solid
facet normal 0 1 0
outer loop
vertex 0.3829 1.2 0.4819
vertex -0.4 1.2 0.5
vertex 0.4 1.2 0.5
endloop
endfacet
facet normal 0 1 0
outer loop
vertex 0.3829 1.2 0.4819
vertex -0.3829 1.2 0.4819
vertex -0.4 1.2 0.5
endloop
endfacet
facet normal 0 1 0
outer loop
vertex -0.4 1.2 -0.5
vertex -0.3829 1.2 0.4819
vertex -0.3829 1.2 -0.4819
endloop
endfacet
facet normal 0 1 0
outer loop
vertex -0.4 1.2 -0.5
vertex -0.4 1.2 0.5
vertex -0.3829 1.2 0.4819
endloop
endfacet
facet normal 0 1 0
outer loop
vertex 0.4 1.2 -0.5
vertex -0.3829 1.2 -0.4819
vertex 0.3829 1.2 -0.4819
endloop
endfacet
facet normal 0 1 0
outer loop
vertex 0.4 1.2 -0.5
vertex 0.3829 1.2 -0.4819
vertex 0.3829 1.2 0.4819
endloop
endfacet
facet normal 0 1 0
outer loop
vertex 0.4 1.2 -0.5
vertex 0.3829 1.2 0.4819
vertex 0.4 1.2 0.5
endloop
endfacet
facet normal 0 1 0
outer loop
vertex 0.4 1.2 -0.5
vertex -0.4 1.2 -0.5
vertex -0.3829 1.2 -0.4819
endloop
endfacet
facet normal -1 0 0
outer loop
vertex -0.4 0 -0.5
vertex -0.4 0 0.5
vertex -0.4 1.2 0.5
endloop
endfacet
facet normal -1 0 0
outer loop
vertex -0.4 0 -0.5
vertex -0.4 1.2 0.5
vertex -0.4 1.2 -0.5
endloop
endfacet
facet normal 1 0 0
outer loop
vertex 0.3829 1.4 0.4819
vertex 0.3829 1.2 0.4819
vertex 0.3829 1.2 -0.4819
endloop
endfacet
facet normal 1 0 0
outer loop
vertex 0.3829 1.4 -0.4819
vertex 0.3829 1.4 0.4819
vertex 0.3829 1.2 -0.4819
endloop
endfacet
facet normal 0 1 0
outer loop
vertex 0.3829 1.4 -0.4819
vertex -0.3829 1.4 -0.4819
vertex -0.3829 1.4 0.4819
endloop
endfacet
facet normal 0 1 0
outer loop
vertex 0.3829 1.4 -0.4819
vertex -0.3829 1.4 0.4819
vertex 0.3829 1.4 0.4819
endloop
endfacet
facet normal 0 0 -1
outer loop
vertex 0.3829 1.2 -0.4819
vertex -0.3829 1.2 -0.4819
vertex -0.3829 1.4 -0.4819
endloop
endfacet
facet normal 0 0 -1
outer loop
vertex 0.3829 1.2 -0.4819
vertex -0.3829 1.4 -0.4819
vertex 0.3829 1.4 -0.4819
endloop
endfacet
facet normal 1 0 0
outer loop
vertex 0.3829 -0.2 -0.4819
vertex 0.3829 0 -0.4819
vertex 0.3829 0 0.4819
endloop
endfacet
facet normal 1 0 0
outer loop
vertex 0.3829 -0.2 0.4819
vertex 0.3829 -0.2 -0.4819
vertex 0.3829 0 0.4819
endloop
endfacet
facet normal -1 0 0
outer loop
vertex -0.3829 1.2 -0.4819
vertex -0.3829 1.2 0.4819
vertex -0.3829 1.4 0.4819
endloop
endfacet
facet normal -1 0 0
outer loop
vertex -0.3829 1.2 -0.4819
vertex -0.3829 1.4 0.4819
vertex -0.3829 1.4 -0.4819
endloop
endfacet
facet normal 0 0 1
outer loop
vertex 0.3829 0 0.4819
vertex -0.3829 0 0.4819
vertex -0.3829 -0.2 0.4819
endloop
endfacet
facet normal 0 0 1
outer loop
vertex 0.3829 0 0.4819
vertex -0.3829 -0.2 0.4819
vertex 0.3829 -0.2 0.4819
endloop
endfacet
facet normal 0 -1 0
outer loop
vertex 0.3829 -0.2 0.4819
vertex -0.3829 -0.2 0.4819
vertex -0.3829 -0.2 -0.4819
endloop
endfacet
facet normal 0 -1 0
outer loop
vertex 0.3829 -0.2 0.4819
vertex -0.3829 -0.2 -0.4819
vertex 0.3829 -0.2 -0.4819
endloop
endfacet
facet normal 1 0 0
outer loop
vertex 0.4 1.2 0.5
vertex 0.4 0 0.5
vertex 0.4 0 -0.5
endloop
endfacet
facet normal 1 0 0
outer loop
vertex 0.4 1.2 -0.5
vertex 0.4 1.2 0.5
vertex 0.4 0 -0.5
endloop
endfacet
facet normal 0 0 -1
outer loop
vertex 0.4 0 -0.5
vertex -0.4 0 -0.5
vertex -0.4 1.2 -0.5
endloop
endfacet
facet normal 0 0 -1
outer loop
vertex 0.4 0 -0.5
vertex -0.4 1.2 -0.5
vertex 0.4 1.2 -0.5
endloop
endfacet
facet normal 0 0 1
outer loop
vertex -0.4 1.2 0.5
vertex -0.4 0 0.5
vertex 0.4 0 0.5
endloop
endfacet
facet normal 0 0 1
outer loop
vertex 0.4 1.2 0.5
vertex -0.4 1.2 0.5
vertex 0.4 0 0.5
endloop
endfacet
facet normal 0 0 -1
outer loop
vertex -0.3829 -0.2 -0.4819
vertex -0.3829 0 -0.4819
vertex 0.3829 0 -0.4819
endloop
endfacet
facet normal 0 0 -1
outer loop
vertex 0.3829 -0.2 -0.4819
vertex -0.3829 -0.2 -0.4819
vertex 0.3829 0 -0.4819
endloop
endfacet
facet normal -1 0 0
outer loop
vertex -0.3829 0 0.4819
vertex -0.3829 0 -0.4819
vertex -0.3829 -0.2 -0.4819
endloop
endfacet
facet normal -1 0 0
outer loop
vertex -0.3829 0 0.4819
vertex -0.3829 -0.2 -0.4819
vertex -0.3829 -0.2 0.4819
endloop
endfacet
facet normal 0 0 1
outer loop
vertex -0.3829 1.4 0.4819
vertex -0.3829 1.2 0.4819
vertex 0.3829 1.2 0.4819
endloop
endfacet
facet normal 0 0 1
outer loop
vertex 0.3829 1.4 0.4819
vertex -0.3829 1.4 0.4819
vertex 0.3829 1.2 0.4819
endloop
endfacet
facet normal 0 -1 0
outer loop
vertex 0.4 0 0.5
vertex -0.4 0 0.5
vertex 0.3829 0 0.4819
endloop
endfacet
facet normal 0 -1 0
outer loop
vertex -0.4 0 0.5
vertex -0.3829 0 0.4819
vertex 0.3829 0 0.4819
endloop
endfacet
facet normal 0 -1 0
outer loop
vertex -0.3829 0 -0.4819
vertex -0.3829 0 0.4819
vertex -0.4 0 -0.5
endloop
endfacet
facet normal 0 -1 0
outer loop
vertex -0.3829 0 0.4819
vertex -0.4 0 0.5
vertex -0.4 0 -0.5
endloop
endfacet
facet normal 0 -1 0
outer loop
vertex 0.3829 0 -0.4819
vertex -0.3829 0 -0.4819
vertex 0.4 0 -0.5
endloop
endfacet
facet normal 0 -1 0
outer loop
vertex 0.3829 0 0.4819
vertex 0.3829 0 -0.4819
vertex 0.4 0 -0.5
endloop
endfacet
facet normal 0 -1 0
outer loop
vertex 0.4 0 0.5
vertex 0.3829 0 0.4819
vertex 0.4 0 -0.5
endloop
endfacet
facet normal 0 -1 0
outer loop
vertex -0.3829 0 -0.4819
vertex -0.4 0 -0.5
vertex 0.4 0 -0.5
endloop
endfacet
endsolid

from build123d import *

# Parameters (mm, degrees)
SKETCH1_W           = 0.8
SKETCH1_H           = 1
BOSS_EXTRUDE1_DEPTH = 1.2
SKETCH2_W           = 0.765895346
SKETCH2_H           = 0.963720624
BOSS_EXTRUDE2_DEPTH = 0.2
SKETCH3_W           = 0.765895346
SKETCH3_H           = 0.963720624
BOSS_EXTRUDE3_DEPTH = 0.2


with BuildPart() as part:
    # Sketch1 → Boss-Extrude1 (new body)
    with BuildSketch(Plane(origin=(0, 0, 0), x_dir=(1, 0, 0), z_dir=(0, 1, 0))):
        Rectangle(SKETCH1_W, SKETCH1_H)
    extrude(amount=BOSS_EXTRUDE1_DEPTH)

    # Sketch2 → Boss-Extrude2 (add)
    with BuildSketch(Plane(origin=(0, 1.2, 0), x_dir=(1, 0, 0), z_dir=(0, 1, 0))):
        Rectangle(SKETCH2_W, SKETCH2_H)
    extrude(amount=BOSS_EXTRUDE2_DEPTH)

    # Sketch3 → Boss-Extrude3 (add)
    with BuildSketch(Plane.XZ):
        Rectangle(SKETCH3_W, SKETCH3_H)
    extrude(amount=BOSS_EXTRUDE3_DEPTH)


solid = part.part
